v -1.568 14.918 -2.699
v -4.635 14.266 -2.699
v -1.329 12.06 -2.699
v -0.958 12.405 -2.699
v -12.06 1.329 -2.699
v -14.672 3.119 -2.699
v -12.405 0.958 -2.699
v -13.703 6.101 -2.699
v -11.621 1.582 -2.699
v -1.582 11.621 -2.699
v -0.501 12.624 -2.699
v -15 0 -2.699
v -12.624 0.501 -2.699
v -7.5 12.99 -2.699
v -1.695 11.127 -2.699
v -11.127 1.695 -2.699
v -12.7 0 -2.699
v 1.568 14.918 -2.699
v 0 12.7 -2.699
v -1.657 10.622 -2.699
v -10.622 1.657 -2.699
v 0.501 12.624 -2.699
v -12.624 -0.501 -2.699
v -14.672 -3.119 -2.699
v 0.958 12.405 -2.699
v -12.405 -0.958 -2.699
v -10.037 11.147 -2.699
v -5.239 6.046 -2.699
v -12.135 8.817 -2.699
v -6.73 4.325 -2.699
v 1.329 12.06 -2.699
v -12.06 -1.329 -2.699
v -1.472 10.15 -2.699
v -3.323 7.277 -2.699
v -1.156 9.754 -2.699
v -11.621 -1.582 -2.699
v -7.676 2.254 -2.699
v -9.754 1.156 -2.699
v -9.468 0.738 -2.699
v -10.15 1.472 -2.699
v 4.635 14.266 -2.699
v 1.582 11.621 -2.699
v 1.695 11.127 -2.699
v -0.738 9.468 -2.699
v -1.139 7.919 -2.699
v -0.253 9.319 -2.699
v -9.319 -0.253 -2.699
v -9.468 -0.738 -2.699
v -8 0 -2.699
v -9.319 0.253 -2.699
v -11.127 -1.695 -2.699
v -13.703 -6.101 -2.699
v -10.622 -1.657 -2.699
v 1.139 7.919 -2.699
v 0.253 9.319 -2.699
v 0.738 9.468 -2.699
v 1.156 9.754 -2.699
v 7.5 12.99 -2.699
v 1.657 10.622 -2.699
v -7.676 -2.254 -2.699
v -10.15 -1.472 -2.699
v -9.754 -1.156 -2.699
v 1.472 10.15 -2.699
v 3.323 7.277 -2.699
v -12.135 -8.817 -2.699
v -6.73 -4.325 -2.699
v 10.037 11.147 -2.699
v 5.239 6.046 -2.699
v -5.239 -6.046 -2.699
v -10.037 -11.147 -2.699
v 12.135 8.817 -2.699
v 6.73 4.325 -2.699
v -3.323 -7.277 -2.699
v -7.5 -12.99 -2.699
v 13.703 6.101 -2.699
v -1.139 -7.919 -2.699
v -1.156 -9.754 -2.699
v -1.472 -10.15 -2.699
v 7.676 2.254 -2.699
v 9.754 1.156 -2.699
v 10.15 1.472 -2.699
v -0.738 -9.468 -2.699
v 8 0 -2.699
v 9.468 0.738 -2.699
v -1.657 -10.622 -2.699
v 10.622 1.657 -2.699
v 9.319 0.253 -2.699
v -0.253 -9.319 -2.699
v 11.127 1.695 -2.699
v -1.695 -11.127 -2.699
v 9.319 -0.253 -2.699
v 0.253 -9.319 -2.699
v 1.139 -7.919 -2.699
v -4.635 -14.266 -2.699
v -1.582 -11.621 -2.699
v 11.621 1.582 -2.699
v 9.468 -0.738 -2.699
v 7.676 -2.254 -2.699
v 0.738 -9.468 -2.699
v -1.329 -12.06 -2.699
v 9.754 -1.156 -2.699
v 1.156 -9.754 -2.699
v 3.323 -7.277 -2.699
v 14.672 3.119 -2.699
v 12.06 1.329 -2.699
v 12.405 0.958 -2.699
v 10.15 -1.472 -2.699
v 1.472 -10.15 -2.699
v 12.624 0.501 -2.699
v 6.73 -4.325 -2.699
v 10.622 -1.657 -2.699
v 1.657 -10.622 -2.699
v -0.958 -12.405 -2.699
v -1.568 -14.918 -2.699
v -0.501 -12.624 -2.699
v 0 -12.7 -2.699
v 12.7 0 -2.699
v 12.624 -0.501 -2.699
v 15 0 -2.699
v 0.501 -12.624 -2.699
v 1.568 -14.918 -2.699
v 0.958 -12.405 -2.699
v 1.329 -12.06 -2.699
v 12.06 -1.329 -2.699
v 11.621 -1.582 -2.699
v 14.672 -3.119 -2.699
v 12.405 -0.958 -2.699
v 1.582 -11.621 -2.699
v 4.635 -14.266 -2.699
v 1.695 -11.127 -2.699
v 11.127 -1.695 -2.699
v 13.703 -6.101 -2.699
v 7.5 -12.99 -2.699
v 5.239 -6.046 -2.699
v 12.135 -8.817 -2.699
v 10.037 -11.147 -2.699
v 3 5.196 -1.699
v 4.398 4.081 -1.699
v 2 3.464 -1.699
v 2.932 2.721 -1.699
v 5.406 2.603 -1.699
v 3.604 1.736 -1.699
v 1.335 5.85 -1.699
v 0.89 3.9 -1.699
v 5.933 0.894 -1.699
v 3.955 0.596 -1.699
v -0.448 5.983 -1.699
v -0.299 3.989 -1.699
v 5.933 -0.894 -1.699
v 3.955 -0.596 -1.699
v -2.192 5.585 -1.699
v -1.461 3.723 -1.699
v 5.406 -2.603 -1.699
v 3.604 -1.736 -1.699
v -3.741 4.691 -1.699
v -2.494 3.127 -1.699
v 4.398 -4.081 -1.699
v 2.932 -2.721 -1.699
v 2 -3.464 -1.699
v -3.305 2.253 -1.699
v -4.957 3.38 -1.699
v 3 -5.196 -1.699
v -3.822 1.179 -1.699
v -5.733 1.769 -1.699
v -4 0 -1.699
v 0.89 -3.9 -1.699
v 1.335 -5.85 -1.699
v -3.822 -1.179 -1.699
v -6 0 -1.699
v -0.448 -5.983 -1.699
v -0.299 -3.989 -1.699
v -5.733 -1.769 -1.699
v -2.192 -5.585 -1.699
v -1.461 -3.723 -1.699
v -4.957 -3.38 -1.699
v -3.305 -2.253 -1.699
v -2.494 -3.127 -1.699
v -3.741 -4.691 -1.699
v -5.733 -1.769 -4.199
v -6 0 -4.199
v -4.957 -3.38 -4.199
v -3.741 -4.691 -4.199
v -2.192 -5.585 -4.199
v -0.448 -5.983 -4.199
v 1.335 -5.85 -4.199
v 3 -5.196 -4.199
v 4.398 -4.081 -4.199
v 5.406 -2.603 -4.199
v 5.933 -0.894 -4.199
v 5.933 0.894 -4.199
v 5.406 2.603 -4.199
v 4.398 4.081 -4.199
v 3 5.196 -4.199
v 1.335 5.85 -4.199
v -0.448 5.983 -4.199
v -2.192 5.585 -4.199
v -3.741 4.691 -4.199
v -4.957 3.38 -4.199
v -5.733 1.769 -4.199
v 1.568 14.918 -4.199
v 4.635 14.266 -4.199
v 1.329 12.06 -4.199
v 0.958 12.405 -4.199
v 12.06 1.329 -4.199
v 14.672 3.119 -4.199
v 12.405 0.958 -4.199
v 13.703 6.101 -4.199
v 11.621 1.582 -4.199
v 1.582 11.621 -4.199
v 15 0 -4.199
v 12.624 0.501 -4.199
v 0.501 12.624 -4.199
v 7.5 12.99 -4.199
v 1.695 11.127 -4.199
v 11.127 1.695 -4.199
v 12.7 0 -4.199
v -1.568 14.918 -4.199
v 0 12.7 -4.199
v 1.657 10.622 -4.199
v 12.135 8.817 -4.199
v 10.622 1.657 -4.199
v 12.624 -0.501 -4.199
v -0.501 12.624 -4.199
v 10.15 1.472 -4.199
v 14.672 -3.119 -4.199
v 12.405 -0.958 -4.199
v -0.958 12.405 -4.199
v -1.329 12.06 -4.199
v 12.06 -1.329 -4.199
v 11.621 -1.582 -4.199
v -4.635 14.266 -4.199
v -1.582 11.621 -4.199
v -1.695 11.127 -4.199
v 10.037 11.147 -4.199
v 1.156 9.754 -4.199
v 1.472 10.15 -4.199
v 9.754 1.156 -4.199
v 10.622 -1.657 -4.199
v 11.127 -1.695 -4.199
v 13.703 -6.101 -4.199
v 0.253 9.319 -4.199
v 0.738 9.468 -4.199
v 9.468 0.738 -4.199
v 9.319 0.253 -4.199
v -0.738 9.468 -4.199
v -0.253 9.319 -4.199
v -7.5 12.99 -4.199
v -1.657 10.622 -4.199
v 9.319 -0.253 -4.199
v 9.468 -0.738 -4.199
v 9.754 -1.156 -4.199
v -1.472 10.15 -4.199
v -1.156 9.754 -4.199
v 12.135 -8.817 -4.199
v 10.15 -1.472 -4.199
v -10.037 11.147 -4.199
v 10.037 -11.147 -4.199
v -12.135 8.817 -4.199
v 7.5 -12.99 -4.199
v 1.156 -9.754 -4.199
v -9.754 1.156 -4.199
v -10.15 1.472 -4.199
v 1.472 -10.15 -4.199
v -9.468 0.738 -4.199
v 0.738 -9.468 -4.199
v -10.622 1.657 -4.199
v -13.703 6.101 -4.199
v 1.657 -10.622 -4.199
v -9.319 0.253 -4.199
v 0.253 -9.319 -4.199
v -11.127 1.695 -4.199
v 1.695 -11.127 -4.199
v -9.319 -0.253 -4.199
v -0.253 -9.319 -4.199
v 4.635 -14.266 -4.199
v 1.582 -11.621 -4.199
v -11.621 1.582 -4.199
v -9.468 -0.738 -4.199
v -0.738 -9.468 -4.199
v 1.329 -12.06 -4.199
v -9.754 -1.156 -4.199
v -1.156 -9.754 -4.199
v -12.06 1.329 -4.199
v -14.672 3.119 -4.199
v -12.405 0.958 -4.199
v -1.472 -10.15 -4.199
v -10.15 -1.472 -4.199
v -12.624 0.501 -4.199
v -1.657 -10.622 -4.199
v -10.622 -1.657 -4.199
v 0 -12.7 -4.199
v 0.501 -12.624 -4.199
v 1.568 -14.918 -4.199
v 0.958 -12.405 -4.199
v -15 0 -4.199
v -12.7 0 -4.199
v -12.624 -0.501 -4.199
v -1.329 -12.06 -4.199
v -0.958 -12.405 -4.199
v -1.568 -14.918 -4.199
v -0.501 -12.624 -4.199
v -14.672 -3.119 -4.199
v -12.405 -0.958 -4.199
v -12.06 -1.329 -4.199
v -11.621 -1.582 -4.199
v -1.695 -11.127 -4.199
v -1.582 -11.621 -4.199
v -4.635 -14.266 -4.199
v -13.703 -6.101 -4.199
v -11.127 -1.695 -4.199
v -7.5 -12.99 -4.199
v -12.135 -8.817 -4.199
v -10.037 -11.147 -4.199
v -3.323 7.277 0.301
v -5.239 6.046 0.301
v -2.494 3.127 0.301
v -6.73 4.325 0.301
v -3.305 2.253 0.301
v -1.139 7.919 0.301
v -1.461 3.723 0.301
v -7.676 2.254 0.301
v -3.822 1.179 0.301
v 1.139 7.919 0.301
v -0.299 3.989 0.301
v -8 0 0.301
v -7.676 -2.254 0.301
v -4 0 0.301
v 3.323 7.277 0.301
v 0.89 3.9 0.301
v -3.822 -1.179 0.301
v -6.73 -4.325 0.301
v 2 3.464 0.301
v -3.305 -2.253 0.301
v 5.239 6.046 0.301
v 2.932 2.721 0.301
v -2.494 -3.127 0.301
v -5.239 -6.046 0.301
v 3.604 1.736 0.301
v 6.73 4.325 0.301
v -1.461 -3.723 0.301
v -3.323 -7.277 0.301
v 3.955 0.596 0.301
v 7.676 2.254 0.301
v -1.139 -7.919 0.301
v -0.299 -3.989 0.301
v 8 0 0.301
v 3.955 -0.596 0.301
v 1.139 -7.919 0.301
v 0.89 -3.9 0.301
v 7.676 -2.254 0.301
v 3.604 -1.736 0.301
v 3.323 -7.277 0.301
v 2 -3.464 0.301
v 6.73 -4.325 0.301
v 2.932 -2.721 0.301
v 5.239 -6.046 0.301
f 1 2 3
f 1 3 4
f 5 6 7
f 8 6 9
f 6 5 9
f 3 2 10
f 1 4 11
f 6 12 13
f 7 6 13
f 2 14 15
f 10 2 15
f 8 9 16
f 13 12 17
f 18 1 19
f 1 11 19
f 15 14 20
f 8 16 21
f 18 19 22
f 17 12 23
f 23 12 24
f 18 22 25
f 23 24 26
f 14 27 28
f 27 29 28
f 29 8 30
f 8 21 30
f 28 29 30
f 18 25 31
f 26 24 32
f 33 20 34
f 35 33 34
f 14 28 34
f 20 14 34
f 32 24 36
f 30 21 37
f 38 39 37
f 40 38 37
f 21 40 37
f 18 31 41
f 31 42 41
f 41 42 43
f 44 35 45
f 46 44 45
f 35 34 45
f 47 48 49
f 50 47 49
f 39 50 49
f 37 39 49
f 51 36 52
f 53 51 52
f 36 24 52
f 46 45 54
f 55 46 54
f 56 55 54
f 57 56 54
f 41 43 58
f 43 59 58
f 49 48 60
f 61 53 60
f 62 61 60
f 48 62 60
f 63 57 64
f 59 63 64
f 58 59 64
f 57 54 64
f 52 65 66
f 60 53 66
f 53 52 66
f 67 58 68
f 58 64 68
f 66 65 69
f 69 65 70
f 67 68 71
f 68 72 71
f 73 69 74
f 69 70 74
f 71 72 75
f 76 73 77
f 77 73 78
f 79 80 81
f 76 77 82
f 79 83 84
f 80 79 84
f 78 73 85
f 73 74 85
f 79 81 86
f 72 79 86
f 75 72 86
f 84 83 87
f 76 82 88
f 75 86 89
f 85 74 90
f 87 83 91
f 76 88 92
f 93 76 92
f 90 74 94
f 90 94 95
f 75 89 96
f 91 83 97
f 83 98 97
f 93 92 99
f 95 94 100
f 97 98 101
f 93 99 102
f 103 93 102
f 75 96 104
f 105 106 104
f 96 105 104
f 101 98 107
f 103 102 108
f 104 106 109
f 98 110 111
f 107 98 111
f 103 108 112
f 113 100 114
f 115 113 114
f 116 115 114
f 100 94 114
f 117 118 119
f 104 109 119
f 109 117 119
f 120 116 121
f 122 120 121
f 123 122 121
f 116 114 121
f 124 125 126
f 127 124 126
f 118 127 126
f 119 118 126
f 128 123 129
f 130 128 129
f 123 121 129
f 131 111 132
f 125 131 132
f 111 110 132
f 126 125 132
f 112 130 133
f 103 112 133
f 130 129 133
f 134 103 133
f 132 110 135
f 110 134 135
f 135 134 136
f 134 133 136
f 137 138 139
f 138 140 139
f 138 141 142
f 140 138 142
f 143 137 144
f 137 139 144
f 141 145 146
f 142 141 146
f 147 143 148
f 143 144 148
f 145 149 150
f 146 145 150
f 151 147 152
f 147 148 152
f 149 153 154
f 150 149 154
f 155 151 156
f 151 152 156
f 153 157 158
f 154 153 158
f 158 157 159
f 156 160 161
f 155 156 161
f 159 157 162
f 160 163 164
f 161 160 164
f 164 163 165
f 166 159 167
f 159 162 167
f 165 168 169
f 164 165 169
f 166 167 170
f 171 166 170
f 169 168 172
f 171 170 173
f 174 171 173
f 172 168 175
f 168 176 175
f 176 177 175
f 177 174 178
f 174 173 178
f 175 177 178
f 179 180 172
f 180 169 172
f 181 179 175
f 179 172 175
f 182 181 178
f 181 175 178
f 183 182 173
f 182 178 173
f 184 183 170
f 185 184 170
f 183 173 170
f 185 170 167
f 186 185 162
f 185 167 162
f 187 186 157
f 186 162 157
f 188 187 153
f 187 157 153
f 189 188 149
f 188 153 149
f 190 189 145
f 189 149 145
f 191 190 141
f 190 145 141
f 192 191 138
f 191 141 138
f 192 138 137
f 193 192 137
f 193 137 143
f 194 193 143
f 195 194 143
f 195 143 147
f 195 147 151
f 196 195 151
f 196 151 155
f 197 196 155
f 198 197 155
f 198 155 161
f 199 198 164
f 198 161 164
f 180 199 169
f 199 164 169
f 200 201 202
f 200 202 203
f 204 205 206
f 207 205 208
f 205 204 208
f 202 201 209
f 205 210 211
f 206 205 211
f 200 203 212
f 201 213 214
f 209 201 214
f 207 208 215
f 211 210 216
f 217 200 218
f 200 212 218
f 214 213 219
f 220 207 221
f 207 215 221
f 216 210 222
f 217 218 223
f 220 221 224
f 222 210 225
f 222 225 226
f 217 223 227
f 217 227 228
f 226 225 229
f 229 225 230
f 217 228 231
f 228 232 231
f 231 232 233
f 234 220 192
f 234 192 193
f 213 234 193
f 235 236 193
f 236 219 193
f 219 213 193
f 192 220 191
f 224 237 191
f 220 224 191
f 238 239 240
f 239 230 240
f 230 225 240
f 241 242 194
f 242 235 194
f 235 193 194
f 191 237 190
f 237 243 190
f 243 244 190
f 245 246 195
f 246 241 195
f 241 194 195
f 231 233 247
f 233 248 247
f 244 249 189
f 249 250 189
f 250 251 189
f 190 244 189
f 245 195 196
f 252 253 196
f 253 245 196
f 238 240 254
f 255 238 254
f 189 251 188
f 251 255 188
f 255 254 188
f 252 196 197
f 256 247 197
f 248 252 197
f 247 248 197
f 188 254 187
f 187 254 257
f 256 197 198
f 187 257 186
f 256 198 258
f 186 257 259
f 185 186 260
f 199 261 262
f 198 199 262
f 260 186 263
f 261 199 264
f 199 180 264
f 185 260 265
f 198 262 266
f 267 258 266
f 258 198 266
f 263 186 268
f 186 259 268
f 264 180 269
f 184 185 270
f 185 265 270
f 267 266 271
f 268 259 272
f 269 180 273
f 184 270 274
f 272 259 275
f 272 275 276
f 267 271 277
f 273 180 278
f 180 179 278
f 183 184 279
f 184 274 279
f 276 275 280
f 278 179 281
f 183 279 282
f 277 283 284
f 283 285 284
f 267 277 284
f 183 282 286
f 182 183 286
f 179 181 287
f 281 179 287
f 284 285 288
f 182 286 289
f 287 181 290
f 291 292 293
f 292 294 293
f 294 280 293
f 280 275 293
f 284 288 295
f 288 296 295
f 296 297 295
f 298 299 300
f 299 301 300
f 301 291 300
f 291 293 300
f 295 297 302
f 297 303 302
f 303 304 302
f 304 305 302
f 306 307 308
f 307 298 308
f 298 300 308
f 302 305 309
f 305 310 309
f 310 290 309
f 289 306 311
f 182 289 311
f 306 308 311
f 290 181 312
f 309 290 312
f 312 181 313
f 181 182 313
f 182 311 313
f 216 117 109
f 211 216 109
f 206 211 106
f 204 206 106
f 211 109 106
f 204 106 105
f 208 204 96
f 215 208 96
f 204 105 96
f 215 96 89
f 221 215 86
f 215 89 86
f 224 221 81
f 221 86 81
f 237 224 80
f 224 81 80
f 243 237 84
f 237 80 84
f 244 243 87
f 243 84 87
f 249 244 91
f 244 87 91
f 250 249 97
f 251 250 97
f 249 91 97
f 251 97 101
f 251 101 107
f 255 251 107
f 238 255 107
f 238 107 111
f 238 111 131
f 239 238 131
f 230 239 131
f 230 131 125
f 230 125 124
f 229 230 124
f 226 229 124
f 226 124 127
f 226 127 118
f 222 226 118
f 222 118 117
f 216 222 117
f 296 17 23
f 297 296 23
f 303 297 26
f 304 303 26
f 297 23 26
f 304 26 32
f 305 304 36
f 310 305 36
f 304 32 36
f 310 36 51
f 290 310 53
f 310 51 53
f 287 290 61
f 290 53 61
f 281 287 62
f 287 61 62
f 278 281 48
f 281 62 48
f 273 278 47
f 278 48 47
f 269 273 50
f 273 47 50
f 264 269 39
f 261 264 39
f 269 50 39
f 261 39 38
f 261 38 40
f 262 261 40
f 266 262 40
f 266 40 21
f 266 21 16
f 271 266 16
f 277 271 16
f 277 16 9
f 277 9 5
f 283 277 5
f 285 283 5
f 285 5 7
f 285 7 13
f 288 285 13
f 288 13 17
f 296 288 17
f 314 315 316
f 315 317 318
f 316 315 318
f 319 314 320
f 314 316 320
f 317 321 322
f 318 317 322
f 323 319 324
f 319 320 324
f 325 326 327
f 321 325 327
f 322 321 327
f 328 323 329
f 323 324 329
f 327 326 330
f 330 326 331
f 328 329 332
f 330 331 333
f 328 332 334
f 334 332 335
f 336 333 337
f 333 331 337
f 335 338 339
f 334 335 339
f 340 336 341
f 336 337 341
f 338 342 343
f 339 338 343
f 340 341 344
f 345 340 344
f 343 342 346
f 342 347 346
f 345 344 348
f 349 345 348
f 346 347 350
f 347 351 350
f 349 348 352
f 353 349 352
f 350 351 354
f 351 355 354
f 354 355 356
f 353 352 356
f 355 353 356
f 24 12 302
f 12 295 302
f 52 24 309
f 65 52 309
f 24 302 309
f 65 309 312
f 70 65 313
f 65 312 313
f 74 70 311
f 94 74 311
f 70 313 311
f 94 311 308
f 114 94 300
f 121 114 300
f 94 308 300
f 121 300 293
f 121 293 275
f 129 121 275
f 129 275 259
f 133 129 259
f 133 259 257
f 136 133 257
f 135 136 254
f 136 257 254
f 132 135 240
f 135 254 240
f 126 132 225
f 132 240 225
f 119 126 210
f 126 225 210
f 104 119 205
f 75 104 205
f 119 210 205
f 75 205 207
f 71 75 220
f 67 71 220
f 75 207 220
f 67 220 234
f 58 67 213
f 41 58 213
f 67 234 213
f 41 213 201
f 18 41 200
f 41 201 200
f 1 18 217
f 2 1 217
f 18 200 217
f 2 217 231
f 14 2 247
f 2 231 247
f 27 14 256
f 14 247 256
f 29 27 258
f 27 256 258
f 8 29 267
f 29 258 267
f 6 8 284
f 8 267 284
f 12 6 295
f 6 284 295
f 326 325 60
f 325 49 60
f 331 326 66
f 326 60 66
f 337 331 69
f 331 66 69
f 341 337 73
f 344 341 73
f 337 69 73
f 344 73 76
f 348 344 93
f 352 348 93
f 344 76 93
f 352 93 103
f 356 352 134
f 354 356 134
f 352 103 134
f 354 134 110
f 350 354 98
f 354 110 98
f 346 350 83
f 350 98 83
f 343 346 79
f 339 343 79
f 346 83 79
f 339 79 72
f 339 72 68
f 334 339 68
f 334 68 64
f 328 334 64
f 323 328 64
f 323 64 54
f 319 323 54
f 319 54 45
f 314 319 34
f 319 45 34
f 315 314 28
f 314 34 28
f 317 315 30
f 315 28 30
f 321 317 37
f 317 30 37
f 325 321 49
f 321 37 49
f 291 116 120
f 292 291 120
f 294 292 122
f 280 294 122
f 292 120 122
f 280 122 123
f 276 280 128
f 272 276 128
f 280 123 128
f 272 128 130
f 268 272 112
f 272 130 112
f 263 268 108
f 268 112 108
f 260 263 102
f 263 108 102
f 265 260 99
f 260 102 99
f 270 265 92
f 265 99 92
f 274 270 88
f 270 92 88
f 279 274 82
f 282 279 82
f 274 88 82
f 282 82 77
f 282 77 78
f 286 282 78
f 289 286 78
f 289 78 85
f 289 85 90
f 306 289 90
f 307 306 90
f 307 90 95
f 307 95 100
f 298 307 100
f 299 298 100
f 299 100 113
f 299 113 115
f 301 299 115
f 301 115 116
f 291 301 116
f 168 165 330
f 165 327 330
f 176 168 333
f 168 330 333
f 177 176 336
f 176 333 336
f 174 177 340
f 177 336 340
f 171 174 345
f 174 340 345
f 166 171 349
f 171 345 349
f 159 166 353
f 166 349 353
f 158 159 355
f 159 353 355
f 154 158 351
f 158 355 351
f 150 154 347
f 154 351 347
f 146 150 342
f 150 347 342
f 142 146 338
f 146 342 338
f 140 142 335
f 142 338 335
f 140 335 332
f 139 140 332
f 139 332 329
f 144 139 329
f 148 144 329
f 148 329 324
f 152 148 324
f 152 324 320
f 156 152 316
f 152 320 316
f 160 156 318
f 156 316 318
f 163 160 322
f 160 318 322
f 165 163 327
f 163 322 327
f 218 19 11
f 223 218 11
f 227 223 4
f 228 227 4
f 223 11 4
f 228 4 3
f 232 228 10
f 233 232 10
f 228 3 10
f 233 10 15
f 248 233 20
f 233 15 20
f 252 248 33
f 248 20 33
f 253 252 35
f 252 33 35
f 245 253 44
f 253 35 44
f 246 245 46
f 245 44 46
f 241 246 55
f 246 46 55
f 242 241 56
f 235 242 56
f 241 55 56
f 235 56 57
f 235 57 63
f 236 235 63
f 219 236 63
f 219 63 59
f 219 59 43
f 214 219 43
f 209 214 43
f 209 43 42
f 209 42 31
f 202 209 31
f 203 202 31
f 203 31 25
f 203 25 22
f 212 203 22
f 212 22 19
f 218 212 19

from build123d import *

# Parameters (mm, degrees)
M3_CLEARANCE_HOLE1_D = 3.4
CIRPATTERN1_COUNT    = 4


with BuildPart() as part:
    # Sketch1 → Revolve1 (revolve)
    with BuildSketch(Plane(origin=(0, 0, 0), x_dir=(1, 0, 0), z_dir=(0, 1, 0))):
        Polygon((4, 1.698663418), (4, -0.301336582), (8, -0.301336582), (8, 2.698663418), (15, 2.698663418), (15, 4.198663418), (6, 4.198663418), (6, 1.698663418), align=None)
    revolve(axis=Axis((0, 0, -9.651281217), (0, 0, 1)))

    # M3 Clearance Hole1 (through all)
    with Locations(Plane(origin=(0, 0, -4.198663418), x_dir=(-1, 0, 0), z_dir=(0, 0, -1))):
        with Locations((-11, 0)):
            m3_clearance_hole1 = Hole(M3_CLEARANCE_HOLE1_D / 2)

    # CirPattern1: M3 Clearance Hole1 ×4 about axis
    cirpattern1_axis = Axis((0, 0, 11.676269368), (0, 0, -1))
    for i in range(1, CIRPATTERN1_COUNT):
        add(m3_clearance_hole1.rotate(cirpattern1_axis, i * 360 / CIRPATTERN1_COUNT), mode=Mode.SUBTRACT)


solid = part.part
